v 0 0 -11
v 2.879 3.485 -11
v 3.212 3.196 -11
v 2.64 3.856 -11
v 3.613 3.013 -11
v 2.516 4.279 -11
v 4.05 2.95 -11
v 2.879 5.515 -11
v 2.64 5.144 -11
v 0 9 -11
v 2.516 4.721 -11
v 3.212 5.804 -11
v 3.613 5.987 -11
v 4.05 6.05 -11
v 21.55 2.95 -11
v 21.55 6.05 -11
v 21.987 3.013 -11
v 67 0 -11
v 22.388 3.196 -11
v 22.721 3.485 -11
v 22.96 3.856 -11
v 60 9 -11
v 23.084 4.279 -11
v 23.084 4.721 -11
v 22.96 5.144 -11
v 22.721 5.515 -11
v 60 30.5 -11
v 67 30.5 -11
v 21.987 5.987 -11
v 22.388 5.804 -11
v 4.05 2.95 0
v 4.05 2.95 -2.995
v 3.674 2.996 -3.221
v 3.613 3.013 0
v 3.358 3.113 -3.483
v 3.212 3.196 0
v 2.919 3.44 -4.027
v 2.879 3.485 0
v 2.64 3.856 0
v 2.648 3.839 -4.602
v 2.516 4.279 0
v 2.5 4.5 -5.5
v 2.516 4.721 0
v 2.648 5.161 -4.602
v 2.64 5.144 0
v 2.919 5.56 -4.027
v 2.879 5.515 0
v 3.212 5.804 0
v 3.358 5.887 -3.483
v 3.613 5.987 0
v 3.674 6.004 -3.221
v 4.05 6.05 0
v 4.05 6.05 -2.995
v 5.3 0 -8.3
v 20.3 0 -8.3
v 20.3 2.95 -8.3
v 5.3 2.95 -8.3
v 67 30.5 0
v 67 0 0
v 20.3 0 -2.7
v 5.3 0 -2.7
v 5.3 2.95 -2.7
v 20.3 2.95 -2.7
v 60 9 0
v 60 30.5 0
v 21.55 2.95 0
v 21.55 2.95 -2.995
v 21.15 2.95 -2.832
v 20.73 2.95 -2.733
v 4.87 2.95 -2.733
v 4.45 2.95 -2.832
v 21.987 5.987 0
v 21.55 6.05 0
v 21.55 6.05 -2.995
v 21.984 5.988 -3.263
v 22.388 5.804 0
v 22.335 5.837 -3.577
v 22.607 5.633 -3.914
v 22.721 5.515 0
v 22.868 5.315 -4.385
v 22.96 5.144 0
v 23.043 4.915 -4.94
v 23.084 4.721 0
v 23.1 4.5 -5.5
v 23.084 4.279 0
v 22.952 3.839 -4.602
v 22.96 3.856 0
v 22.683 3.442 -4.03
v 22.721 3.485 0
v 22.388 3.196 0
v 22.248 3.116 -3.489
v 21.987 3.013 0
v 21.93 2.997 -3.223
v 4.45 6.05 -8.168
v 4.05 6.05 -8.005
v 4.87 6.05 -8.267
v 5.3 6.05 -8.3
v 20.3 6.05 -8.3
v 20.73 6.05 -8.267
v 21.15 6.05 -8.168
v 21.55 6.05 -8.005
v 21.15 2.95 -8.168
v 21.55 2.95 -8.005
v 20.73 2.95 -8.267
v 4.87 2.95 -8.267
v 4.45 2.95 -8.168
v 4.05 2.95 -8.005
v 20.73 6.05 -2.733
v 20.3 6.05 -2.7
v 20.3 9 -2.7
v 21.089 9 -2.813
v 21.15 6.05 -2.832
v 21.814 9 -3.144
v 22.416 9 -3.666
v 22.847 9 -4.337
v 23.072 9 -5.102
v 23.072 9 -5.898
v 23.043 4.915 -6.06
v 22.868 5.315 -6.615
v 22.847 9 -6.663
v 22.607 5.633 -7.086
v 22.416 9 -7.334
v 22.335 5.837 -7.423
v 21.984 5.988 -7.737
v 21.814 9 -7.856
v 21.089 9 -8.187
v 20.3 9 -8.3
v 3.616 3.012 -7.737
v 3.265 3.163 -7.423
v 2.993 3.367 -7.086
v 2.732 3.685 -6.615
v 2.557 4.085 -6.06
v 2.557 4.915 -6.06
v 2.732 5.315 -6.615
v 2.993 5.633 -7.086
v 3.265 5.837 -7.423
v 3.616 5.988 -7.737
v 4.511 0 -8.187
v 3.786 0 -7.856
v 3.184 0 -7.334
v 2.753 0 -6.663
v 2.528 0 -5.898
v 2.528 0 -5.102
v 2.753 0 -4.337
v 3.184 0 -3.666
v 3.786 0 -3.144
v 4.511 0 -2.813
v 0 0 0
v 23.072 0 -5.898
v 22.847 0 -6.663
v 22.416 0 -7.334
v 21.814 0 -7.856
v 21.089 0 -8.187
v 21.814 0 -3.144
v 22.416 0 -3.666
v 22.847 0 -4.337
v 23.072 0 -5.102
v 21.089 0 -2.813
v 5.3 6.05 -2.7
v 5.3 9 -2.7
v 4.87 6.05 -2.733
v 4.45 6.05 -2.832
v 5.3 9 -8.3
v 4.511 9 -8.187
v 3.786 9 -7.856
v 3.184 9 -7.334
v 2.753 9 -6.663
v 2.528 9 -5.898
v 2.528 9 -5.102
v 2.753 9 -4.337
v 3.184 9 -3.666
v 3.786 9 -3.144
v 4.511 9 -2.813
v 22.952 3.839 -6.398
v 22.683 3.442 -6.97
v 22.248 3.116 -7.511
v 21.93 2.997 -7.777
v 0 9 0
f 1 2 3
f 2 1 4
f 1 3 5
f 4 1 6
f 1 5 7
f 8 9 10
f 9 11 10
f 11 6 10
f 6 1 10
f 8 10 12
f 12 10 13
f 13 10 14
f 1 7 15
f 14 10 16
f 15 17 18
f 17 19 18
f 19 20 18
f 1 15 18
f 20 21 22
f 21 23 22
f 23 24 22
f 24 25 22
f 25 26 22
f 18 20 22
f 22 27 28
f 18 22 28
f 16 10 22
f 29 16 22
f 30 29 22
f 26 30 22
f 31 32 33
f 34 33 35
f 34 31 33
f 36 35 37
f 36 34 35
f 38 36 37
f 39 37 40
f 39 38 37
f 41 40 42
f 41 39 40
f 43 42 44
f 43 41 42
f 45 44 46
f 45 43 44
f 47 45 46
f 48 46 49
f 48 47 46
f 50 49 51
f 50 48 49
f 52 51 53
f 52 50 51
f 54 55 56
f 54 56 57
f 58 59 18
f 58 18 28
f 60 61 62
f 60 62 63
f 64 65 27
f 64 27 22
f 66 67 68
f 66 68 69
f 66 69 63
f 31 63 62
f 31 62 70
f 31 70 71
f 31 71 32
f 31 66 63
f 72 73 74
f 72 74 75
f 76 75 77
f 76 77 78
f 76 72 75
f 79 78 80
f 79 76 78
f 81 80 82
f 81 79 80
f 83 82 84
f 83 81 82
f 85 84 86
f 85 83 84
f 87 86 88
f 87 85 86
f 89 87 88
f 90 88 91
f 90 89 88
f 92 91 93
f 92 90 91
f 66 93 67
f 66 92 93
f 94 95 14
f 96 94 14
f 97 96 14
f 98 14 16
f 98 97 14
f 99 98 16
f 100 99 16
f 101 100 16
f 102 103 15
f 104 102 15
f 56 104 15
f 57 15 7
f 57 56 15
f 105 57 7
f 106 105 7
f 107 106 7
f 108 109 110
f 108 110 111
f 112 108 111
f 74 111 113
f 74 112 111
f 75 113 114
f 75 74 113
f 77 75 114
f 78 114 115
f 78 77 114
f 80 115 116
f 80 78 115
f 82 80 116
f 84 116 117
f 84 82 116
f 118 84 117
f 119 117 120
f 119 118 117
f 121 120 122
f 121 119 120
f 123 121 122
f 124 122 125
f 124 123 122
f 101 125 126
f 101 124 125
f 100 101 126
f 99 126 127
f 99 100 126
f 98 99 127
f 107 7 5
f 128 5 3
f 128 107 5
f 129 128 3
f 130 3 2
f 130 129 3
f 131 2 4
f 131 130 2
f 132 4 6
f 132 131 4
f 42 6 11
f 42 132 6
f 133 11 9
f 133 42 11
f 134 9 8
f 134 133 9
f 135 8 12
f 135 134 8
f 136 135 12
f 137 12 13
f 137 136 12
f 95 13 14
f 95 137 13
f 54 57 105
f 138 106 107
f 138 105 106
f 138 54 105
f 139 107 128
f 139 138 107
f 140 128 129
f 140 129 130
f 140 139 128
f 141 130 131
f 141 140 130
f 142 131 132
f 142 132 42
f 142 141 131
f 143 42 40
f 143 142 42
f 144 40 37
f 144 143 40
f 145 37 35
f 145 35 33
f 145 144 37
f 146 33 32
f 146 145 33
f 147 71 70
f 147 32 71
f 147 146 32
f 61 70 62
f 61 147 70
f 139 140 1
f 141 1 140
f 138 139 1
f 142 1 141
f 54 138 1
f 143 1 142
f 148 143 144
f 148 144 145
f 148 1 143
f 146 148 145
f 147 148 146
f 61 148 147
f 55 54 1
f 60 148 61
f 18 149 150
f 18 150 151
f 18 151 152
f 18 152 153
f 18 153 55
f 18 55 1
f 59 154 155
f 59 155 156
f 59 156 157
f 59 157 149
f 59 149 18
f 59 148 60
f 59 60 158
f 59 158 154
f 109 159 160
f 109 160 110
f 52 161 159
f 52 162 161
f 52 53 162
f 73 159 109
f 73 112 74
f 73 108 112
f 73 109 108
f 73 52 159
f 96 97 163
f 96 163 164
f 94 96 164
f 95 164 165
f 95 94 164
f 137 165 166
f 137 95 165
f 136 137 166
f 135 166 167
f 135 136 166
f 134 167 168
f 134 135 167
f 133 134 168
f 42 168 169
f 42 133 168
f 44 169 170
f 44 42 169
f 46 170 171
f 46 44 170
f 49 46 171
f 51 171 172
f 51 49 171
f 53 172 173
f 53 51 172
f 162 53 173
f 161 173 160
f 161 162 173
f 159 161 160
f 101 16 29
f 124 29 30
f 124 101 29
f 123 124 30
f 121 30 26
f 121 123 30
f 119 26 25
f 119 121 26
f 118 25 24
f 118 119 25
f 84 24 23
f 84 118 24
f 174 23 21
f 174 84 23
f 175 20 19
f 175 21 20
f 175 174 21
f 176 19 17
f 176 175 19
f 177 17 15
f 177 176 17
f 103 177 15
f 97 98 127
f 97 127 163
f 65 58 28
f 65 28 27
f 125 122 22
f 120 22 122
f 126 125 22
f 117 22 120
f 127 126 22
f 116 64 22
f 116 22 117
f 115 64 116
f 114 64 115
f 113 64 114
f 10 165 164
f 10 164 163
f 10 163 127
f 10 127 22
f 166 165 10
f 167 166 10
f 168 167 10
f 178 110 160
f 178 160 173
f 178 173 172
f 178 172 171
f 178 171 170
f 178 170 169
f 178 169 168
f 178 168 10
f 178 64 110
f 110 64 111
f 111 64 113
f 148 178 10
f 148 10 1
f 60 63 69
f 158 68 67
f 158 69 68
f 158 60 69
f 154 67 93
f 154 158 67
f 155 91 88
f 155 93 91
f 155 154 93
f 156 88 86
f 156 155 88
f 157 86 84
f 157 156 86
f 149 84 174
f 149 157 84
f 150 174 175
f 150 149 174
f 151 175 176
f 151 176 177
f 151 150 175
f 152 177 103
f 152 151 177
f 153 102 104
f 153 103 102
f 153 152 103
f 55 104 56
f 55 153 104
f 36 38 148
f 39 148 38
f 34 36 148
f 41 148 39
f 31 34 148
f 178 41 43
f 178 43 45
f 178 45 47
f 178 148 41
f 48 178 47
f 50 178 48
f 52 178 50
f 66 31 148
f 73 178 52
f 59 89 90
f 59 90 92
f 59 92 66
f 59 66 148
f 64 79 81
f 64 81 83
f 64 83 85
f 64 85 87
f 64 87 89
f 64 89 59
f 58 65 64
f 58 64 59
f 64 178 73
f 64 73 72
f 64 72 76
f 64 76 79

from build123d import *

# Parameters (mm, degrees)
BOSS_EXTRUDE1_DEPTH = 11
CUT_EXTRUDE1_DEPTH  = 75.432855649
CUT_EXTRUDE2_DEPTH  = 75.432855649


with BuildPart() as part:
    # Sketch1 → Boss-Extrude1 (new body)
    with BuildSketch(Plane.XY):
        Polygon((0, 0), (67, 0), (67, 30.5), (60, 30.5), (60, 9), (0, 9), align=None)
    extrude(amount=-BOSS_EXTRUDE1_DEPTH)

    # Sketch2 → Cut-Extrude1 (cut, through all)
    with BuildSketch(Plane.XZ):
        with BuildLine():
            Line((5.3, -2.7), (20.3, -2.7))
            ThreePointArc((20.3, -2.7), (23.1, -5.5), (20.3, -8.3))
            Line((20.3, -8.3), (5.3, -8.3))
            ThreePointArc((5.3, -8.3), (2.5, -5.5), (5.3, -2.7))
        make_face()
    extrude(amount=-CUT_EXTRUDE1_DEPTH, mode=Mode.SUBTRACT)

    # Sketch3 → Cut-Extrude2 (cut, through all)
    with BuildSketch(Plane.XY):
        with BuildLine():
            Line((4.05, 6.05), (21.55, 6.05))
            ThreePointArc((21.55, 6.05), (23.1, 4.5), (21.55, 2.95))
            Line((21.55, 2.95), (4.05, 2.95))
            ThreePointArc((4.05, 2.95), (2.5, 4.5), (4.05, 6.05))
        make_face()
    extrude(amount=-CUT_EXTRUDE2_DEPTH, mode=Mode.SUBTRACT)


solid = part.part
